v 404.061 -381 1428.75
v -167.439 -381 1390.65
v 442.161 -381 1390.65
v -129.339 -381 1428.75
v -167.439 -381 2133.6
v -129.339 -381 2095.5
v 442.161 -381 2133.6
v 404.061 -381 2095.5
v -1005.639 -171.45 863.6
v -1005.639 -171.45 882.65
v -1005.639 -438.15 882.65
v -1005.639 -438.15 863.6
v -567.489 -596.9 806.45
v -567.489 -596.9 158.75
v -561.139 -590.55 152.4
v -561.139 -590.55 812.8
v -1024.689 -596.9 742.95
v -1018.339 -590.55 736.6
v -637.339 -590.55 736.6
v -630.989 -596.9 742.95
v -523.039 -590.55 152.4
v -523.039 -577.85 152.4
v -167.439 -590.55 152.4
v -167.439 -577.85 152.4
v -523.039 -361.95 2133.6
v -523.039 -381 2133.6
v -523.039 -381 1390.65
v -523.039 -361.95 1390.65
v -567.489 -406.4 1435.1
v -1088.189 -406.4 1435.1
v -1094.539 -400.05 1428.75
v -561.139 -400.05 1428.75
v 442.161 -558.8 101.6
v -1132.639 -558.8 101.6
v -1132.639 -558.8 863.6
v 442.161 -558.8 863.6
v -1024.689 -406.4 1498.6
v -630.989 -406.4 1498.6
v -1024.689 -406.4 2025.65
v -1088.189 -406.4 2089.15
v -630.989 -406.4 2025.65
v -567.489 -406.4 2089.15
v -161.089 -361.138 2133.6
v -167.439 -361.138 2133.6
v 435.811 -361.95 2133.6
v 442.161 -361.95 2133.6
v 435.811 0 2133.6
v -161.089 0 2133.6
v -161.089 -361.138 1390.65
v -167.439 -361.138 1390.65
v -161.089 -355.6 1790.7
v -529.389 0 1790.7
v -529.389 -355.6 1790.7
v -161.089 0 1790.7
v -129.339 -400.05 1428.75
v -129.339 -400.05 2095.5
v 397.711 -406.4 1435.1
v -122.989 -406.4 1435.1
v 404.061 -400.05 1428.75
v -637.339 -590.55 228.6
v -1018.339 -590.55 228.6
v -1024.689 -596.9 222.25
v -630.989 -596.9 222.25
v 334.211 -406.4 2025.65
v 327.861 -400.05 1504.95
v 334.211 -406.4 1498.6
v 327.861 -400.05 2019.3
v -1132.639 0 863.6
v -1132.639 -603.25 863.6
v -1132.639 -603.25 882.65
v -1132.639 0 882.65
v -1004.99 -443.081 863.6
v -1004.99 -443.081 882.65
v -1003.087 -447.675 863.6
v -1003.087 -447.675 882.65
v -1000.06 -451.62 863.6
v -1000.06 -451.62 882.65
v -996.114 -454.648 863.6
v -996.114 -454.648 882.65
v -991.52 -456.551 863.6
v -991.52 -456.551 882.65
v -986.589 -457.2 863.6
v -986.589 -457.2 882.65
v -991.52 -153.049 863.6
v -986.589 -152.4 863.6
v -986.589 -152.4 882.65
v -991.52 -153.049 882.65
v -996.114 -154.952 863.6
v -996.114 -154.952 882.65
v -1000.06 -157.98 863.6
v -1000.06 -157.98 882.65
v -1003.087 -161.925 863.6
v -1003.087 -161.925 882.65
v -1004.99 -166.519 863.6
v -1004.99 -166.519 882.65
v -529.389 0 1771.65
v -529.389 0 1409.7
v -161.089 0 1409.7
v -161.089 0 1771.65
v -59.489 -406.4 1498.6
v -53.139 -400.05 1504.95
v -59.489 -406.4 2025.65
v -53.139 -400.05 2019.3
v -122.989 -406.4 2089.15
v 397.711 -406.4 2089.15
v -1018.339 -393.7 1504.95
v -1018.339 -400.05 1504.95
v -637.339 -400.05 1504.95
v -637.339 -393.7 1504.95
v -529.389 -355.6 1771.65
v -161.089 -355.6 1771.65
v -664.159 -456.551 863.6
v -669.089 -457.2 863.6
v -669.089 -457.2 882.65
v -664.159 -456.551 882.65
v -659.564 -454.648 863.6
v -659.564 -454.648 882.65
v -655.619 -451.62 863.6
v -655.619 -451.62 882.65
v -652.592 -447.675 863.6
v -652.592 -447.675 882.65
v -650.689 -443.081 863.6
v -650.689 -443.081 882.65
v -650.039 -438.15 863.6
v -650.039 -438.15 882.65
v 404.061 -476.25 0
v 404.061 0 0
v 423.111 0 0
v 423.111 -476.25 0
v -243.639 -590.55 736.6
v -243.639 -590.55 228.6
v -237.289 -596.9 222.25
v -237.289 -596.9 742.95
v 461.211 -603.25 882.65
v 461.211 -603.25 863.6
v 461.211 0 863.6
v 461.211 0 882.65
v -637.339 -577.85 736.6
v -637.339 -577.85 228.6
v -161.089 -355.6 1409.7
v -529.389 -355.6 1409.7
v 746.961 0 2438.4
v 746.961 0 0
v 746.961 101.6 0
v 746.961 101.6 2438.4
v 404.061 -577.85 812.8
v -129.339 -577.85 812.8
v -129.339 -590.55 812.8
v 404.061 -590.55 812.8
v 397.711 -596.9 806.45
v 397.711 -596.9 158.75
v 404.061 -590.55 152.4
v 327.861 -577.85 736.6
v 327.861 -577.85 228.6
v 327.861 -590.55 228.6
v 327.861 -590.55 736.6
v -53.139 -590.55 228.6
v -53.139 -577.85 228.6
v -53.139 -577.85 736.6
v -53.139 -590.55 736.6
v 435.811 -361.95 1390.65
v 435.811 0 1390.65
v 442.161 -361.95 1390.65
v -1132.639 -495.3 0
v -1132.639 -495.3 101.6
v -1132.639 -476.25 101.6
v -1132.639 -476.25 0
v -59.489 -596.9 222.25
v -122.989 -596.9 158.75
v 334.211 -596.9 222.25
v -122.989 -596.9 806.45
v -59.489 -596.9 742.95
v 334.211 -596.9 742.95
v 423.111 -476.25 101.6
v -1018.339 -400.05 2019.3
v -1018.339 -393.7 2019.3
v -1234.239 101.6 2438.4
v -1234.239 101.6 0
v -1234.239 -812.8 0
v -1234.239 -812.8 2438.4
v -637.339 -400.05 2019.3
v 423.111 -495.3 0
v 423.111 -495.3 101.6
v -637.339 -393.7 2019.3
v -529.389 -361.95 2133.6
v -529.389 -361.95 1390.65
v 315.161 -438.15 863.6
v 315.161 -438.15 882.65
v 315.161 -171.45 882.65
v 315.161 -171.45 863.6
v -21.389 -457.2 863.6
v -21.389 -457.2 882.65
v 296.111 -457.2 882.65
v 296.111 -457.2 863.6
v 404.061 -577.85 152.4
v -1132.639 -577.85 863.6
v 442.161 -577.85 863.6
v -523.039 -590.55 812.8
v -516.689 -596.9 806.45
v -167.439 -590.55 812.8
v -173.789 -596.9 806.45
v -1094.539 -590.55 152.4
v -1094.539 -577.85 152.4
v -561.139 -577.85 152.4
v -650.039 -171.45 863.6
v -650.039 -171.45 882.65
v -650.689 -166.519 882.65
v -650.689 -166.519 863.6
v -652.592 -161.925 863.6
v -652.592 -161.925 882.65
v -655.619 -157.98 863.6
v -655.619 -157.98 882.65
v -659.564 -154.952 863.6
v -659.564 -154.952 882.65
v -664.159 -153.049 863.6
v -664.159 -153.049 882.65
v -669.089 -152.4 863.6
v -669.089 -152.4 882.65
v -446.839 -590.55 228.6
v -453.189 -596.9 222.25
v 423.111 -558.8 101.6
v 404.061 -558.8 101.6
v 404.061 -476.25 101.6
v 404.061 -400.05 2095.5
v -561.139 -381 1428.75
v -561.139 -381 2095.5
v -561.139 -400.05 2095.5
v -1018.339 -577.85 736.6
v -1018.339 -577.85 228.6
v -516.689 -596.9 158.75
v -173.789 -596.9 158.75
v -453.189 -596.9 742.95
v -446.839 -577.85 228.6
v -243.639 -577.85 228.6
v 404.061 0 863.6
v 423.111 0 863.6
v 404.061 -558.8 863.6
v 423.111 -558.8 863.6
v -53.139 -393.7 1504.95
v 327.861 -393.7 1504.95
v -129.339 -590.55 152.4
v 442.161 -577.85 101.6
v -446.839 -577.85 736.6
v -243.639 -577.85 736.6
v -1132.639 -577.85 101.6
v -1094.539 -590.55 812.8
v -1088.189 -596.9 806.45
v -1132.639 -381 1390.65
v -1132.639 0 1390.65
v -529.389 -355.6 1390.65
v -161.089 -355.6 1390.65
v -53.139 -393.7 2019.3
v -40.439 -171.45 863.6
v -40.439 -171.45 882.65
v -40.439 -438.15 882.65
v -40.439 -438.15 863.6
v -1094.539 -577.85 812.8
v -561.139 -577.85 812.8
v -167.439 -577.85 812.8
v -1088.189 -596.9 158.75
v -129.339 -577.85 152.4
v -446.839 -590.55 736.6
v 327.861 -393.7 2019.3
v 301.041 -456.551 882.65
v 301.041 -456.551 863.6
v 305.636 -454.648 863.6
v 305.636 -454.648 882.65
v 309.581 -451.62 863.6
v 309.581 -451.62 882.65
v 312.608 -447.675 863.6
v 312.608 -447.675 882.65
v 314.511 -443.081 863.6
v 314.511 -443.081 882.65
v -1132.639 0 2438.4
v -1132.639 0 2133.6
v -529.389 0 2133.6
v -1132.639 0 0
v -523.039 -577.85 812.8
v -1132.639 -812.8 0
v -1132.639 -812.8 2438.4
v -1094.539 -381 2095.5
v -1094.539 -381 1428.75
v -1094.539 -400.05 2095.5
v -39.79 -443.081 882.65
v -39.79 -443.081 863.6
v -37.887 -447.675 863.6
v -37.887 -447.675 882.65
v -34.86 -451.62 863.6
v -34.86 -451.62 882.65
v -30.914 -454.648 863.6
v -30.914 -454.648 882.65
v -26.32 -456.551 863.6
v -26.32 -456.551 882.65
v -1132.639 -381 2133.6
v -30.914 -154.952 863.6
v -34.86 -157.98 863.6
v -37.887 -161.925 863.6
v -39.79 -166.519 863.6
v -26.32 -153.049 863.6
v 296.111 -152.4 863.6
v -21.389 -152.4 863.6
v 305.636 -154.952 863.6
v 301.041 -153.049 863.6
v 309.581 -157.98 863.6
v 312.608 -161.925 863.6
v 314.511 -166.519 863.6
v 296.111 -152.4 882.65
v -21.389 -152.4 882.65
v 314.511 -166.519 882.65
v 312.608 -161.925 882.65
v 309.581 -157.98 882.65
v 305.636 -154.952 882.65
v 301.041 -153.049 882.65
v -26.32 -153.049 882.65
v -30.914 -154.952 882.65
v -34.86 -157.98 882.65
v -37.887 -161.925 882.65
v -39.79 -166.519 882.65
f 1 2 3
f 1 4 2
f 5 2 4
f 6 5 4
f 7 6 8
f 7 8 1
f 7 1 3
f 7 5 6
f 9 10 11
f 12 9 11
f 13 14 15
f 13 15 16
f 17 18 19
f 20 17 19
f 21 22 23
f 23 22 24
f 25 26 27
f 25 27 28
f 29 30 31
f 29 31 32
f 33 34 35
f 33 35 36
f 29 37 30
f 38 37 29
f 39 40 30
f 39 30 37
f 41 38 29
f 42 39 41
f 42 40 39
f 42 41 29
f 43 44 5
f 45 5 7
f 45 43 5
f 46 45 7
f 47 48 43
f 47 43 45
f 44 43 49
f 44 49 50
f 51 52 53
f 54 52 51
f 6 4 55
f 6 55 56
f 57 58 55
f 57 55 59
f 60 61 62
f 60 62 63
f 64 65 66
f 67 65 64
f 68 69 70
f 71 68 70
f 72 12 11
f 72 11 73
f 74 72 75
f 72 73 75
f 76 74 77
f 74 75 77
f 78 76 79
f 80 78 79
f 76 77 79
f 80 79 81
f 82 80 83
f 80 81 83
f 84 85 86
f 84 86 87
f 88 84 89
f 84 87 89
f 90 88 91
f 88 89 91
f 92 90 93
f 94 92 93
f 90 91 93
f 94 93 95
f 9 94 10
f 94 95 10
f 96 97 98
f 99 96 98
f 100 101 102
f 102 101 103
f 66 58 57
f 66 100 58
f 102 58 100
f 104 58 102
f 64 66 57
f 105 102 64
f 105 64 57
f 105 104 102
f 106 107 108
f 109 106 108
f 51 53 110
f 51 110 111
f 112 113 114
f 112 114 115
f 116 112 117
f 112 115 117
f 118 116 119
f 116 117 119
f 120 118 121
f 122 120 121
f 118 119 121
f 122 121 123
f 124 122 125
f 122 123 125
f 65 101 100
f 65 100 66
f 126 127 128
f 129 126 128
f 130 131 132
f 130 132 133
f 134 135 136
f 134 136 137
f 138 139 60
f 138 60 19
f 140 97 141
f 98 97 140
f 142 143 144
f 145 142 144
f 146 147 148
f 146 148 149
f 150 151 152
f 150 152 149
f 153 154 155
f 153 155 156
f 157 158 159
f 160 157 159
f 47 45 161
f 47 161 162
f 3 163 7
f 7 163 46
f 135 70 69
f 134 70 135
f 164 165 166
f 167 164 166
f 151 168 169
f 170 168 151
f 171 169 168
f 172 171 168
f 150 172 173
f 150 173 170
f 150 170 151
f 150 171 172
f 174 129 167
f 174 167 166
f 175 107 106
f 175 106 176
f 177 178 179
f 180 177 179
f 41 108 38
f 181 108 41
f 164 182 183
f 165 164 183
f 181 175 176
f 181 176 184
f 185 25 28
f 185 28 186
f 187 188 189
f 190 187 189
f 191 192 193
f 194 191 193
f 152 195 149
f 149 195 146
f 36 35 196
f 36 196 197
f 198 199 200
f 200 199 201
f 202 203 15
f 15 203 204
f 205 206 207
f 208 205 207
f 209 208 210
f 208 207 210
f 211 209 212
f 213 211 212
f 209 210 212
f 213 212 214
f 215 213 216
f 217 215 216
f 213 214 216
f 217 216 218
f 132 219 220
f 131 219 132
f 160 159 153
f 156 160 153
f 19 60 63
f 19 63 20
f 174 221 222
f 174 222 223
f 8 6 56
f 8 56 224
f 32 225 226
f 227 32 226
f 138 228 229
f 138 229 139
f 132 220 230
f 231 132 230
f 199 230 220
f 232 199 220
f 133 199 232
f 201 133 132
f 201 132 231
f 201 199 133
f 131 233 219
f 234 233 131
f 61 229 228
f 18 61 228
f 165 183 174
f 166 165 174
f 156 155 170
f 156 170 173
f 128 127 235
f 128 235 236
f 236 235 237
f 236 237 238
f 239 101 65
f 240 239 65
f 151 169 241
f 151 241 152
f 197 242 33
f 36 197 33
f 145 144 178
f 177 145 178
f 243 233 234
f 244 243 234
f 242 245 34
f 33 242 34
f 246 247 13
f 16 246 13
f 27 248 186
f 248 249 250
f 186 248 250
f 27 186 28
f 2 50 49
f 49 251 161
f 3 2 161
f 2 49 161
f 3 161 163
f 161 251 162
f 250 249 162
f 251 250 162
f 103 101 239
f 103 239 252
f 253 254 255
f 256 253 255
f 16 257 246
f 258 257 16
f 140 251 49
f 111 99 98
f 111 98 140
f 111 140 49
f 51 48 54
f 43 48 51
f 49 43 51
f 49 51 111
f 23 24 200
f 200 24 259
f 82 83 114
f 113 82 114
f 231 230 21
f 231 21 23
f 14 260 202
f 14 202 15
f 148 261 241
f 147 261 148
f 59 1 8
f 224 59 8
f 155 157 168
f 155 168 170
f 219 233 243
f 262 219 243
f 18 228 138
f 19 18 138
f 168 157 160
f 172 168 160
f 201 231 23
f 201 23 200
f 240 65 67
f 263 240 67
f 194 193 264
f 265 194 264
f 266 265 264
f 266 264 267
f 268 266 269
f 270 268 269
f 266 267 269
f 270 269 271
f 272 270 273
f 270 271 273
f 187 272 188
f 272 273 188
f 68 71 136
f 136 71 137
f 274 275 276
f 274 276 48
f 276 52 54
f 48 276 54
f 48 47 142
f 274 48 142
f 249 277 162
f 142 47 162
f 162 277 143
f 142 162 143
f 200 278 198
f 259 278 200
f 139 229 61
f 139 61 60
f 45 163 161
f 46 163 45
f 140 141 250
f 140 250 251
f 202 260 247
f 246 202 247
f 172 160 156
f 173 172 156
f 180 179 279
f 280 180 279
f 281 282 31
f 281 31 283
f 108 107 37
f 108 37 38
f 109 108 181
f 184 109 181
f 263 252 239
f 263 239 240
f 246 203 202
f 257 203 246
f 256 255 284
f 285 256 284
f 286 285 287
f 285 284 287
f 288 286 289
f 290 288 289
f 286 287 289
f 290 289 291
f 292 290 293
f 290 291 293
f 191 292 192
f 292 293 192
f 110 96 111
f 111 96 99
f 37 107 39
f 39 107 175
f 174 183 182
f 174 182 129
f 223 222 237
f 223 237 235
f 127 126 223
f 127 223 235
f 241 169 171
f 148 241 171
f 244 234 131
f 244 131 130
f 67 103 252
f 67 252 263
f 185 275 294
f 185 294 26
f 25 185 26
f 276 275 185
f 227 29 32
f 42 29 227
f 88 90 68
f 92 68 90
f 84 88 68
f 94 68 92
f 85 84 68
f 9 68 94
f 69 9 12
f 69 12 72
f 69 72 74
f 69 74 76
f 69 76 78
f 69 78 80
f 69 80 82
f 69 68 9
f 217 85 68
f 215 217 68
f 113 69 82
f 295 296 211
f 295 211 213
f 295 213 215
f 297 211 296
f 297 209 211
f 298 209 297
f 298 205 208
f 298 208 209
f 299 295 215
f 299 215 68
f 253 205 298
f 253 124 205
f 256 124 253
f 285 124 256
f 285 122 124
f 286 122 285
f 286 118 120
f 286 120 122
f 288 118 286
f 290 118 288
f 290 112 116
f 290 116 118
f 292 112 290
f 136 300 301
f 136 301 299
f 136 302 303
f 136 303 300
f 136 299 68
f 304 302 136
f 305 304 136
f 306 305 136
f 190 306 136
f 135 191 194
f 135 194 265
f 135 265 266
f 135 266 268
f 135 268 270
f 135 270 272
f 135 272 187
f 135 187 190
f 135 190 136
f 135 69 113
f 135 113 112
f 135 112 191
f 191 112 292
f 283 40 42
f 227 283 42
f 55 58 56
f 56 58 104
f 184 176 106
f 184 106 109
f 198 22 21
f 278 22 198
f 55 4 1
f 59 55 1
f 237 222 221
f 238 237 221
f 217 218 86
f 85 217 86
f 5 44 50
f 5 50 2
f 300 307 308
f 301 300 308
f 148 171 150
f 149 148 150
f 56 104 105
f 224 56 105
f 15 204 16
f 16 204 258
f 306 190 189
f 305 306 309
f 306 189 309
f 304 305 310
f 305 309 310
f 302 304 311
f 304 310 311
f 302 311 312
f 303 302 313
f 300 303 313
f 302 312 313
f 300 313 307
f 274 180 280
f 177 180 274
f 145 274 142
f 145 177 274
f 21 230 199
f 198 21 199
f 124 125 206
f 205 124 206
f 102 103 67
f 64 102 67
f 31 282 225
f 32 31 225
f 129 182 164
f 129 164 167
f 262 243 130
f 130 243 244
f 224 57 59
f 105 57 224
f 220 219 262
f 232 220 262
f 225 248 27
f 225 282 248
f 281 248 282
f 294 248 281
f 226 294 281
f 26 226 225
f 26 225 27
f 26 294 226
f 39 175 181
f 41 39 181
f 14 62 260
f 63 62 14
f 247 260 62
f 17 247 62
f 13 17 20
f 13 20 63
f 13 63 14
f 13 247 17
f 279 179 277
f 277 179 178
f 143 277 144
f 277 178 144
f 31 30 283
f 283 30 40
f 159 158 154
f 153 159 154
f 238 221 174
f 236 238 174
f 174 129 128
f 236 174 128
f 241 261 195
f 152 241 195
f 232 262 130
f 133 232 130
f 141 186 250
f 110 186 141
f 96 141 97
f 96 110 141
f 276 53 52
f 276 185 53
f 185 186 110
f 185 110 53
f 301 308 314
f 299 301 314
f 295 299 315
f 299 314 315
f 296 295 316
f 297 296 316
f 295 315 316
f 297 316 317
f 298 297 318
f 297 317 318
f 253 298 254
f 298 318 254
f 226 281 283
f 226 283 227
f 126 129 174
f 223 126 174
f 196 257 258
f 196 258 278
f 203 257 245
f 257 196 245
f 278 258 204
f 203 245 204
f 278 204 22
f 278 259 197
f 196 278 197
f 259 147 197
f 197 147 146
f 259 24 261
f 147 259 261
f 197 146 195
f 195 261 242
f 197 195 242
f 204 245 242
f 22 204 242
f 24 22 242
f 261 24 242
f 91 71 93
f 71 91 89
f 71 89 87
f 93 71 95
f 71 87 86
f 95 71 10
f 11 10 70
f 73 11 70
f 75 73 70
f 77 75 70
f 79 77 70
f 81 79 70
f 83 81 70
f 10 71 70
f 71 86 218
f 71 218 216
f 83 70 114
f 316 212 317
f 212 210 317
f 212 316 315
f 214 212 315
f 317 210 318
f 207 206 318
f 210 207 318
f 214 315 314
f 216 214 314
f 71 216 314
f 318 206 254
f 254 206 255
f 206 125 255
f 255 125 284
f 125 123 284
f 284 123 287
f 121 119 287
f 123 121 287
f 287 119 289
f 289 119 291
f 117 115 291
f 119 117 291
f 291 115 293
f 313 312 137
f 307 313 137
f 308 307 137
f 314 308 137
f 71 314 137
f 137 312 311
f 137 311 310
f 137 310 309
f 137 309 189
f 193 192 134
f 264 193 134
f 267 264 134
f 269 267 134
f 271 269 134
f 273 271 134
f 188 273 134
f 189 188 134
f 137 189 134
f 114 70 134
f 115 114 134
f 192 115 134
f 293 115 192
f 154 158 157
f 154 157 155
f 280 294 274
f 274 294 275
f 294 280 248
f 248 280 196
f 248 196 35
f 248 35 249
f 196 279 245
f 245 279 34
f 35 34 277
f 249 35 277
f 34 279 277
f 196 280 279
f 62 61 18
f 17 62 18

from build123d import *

# Parameters (mm, degrees)
F1_DEPTH      = 2438.4
F2_W          = 1574.8
F2_H          = 19.05
F3_DEPTH      = 863.6
F4_W          = 19.05
F4_H          = 558.8
F5_DEPTH      = 863.6
F6_W          = 1593.85
F6_H          = 19.05
F7_DEPTH      = 25.4
F7_DEPTH_BACK = 577.85
F9_DEPTH      = 25.4
F10_W         = 533.4
F10_H         = 660.4
F10_W_2       = 381
F10_H_2       = 508
F10_W_3       = 355.6
F10_W_4       = 203.2
F11_DEPTH     = 19.05
F12_SIZE      = 6.35
F13_SIZE      = 6.35
F14_W         = 260.281230233
F14_H         = 101.6
F15_DEPTH     = 1574.8
F16_W         = 19.05
F16_H         = 101.6
F17_DEPTH     = 1555.75
F19_W         = 584.2
F19_H         = 742.95
F20_DEPTH     = 381
F21_W         = 406.4
F21_H         = 19.05
F22_DEPTH     = 355.6
F23_W         = 533.4
F23_H         = 666.75
F24_DEPTH     = 25.4
F25_W         = 381
F25_H         = 514.35
F26_DEPTH     = 12.7
F27_SIZE      = 6.35
F28_W         = 361.95
F28_H         = 742.95
F29_DEPTH     = 6.35
F30_W         = 361.95
F30_H         = 743.0462871552
F31_DEPTH     = 6.35
F32_W         = 6.35
F32_H         = 361.1382842064
F33_DEPTH     = 762
F35_DEPTH     = 742.95


with BuildPart() as f1:
    # F0 (on Top) → F1 (new body)
    with BuildSketch(Plane.XY):
        Polygon((-1132.639487573, -812.8), (-1132.639487573, 0), (746.960512427, 0), (746.960512427, 101.6), (-1234.239487573, 101.6), (-1234.239487573, -812.8), align=None)
    extrude(amount=F1_DEPTH)

    # F2 (on Top) → F3 (join)
    with BuildSketch(Plane.XY):
        with Locations((-345.239487573, -568.325)):
            Rectangle(F2_W, F2_H)
    extrude(amount=F3_DEPTH)

    # F10 (on face) → F11 (join)
    with BuildSketch(Plane.XZ.offset(577.85)):
        with Locations((-827.839487573, 482.6)):
            Rectangle(F10_W, F10_H)
        with Locations((-827.839487573, 482.6)):
            Rectangle(F10_W_2, F10_H_2, mode=Mode.SUBTRACT)
        with Locations((-345.239487573, 482.6)):
            Rectangle(F10_W_3, F10_H)
        with Locations((-345.239487573, 482.6)):
            Rectangle(F10_W_4, F10_H_2, mode=Mode.SUBTRACT)
        with Locations((137.360512427, 482.6)):
            Rectangle(F10_W, F10_H)
        with Locations((137.360512427, 482.6)):
            Rectangle(F10_W_2, F10_H_2, mode=Mode.SUBTRACT)
    extrude(amount=F11_DEPTH)

    # F12
    f12_edges = [f1.edges().sort_by_distance(p)[0] for p in [
        (-827.839488, -596.9, 812.8),
        (-561.139488, -596.9, 482.6),
        (-827.839488, -596.9, 152.4),
        (-1094.539488, -596.9, 482.6),
        (-345.239488, -596.9, 812.8),
        (-523.039488, -596.9, 482.6),
        (-345.239488, -596.9, 152.4),
        (-167.439488, -596.9, 482.6),
        (137.360512, -596.9, 812.8),
        (-129.339488, -596.9, 482.6),
        (404.060512, -596.9, 482.6),
        (137.360512, -596.9, 152.4),
    ]]
    chamfer(f12_edges, length=F12_SIZE)

    # F13
    f13_edges = [f1.edges().sort_by_distance(p)[0] for p in [
        (-827.839488, -596.9, 736.6),
        (-637.339488, -596.9, 482.6),
        (-1018.339488, -596.9, 482.6),
        (-827.839488, -596.9, 228.6),
        (-446.839488, -596.9, 482.6),
        (-243.639488, -596.9, 482.6),
        (-345.239488, -596.9, 736.6),
        (-345.239488, -596.9, 228.6),
        (137.360512, -596.9, 228.6),
        (-53.139488, -596.9, 482.6),
        (327.860512, -596.9, 482.6),
        (137.360512, -596.9, 736.6),
    ]]
    chamfer(f13_edges, length=F13_SIZE)


with BuildPart() as f5:
    # F4 (on Top) → F5 (new body)
    with BuildSketch(Plane.XY):
        with Locations((413.585512427, -279.4)):
            Rectangle(F4_W, F4_H)
    extrude(amount=F5_DEPTH)


with BuildPart() as f7:
    # F6 (on face) → F7 (new body, two sides)
    with BuildSketch(Plane.XZ.offset(577.85)) as f7_sk:
        with Locations((-335.714487573, 873.125)):
            Rectangle(F6_W, F6_H)
    extrude(amount=F7_DEPTH)
    extrude(f7_sk.sketch, amount=-F7_DEPTH_BACK)

    # F8 (on face) → F9 (cut)
    with BuildSketch(Plane.XY.offset(882.65)):
        with BuildLine():
            Line((-669.089487573, -152.4), (-986.589487573, -152.4))
            ThreePointArc((-986.589487573, -152.4), (-1000.0598717546, -157.9796158184), (-1005.639487573, -171.45))
            Line((-1005.639487573, -171.45), (-1005.639487573, -438.15))
            ThreePointArc((-1005.639487573, -438.15), (-1000.0598717546, -451.6203841816), (-986.589487573, -457.2))
            Line((-986.589487573, -457.2), (-669.089487573, -457.2))
            ThreePointArc((-669.089487573, -457.2), (-655.6191033914, -451.6203841816), (-650.039487573, -438.15))
            Line((-650.039487573, -438.15), (-650.039487573, -171.45))
            ThreePointArc((-650.039487573, -171.45), (-655.6191033914, -157.9796158184), (-669.089487573, -152.4))
        make_face()
        with BuildLine():
            Line((296.110512427, -152.4), (-21.389487573, -152.4))
            ThreePointArc((-21.389487573, -152.4), (-34.8598717546, -157.9796158184), (-40.439487573, -171.45))
            Line((-40.439487573, -171.45), (-40.439487573, -438.15))
            ThreePointArc((-40.439487573, -438.15), (-34.8598717546, -451.6203841816), (-21.389487573, -457.2))
            Line((-21.389487573, -457.2), (296.110512427, -457.2))
            ThreePointArc((296.110512427, -457.2), (309.5808966086, -451.6203841816), (315.160512427, -438.15))
            Line((315.160512427, -438.15), (315.160512427, -171.45))
            ThreePointArc((315.160512427, -171.45), (309.5808966086, -157.9796158184), (296.110512427, -152.4))
        make_face()
    extrude(amount=-F9_DEPTH, mode=Mode.SUBTRACT)


with BuildPart() as f15_tool:
    # F14 (on face) → F15 (new body, through all)
    with BuildSketch(Plane.YZ.offset(442.160512427)):
        with Locations((-606.3906151165, 50.8)):
            Rectangle(F14_W, F14_H)
    extrude(amount=-F15_DEPTH)


with BuildPart() as f1_1:
    add(f1.part)

    # F15: cut by f15_tool
    add(f15_tool.part, mode=Mode.SUBTRACT)

    # F19 (on face) → F20 (join)
    with BuildSketch(Plane.XZ):
        with Locations((-840.539487573, 1762.125)):
            Rectangle(F19_W, F19_H)
        with Locations((150.060512427, 1762.125)):
            Rectangle(F19_W, F19_H)
    extrude(amount=F20_DEPTH)

    # F21 (on face) → F22 (join)
    with BuildSketch(Plane.XZ):
        with Locations((-345.239487573, 1400.175)):
            Rectangle(F21_W, F21_H)
        with Locations((-345.239487573, 1781.175)):
            Rectangle(F21_W, F21_H)
    extrude(amount=F22_DEPTH)

    # F23 (on face) → F24 (join)
    with BuildSketch(Plane.XZ.offset(381)):
        with Locations((-827.839487573, 1762.125)):
            Rectangle(F23_W, F23_H)
        with Locations((137.360512427, 1762.125)):
            Rectangle(F23_W, F23_H)
    extrude(amount=F24_DEPTH)

    # F25 (on face) → F26 (cut)
    with BuildSketch(Plane.XZ.offset(406.4)):
        with Locations((-827.839487573, 1762.125)):
            Rectangle(F25_W, F25_H)
        with Locations((137.360512427, 1762.125)):
            Rectangle(F25_W, F25_H)
    extrude(amount=-F26_DEPTH, mode=Mode.SUBTRACT)

    # F27
    f27_edges = [f1_1.edges().sort_by_distance(p)[0] for p in [
        (-827.839488, -406.4, 2019.3),
        (-637.339488, -406.4, 1762.125),
        (-827.839488, -406.4, 1504.95),
        (-1018.339488, -406.4, 1762.125),
        (137.360512, -406.4, 1504.95),
        (137.360512, -406.4, 2019.3),
        (327.860512, -406.4, 1762.125),
        (-53.139488, -406.4, 1762.125),
        (-129.339488, -406.4, 1762.125),
        (137.360512, -406.4, 1428.75),
        (404.060512, -406.4, 1762.125),
        (137.360512, -406.4, 2095.5),
        (-827.839488, -406.4, 2095.5),
        (-561.139488, -406.4, 1762.125),
        (-827.839488, -406.4, 1428.75),
        (-1094.539488, -406.4, 1762.125),
    ]]
    chamfer(f27_edges, length=F27_SIZE)

    # F28 (on face) → F29 (cut)
    with BuildSketch(Plane.YZ.offset(442.160512427)):
        with Locations((-180.975, 1762.125)):
            Rectangle(F28_W, F28_H)
    extrude(amount=-F29_DEPTH, mode=Mode.SUBTRACT)

    # F30 (on face) → F31 (cut)
    with BuildSketch(Plane.YZ.offset(-548.439487573)):
        with Locations((-180.975, 1762.0768564224)):
            Rectangle(F30_W, F30_H)
    extrude(amount=-F31_DEPTH, mode=Mode.SUBTRACT)

    # F32 (on face) → F33 (cut)
    with BuildSketch(Plane.XY.offset(2133.6)):
        with Locations((-138.864487573, -180.5691421032)):
            Rectangle(F32_W, F32_H)
    extrude(amount=-F33_DEPTH, mode=Mode.SUBTRACT)

    # F34 (on face) → F35 (join, through all)
    with BuildSketch(Plane.XY.offset(2133.6)):
        Polygon((-529.389487573, 0), (-554.789487573, 0), (-554.789487573, -381), (-523.039487573, -381), (-523.039487573, -361.95), (-529.389487573, -361.95), align=None)
        Polygon((-135.689487573, -381), (-135.689487573, 0), (-161.089487573, 0), (-161.089487573, -361.1382842064), (-167.439487573, -361.1382842064), (-167.439487573, -381), align=None)
    extrude(amount=-F35_DEPTH)


with BuildPart() as f5_1:
    add(f5.part)

    # F15: cut by f15_tool
    add(f15_tool.part, mode=Mode.SUBTRACT)


with BuildPart() as f17:
    # F16 (on face) → F17 (new body, through all)
    with BuildSketch(Plane.YZ.offset(423.110512427)):
        with Locations((-485.775, 50.8)):
            Rectangle(F16_W, F16_H)
    extrude(amount=-F17_DEPTH)


solid = Compound([f7.part, f1_1.part, f5_1.part, f17.part])
